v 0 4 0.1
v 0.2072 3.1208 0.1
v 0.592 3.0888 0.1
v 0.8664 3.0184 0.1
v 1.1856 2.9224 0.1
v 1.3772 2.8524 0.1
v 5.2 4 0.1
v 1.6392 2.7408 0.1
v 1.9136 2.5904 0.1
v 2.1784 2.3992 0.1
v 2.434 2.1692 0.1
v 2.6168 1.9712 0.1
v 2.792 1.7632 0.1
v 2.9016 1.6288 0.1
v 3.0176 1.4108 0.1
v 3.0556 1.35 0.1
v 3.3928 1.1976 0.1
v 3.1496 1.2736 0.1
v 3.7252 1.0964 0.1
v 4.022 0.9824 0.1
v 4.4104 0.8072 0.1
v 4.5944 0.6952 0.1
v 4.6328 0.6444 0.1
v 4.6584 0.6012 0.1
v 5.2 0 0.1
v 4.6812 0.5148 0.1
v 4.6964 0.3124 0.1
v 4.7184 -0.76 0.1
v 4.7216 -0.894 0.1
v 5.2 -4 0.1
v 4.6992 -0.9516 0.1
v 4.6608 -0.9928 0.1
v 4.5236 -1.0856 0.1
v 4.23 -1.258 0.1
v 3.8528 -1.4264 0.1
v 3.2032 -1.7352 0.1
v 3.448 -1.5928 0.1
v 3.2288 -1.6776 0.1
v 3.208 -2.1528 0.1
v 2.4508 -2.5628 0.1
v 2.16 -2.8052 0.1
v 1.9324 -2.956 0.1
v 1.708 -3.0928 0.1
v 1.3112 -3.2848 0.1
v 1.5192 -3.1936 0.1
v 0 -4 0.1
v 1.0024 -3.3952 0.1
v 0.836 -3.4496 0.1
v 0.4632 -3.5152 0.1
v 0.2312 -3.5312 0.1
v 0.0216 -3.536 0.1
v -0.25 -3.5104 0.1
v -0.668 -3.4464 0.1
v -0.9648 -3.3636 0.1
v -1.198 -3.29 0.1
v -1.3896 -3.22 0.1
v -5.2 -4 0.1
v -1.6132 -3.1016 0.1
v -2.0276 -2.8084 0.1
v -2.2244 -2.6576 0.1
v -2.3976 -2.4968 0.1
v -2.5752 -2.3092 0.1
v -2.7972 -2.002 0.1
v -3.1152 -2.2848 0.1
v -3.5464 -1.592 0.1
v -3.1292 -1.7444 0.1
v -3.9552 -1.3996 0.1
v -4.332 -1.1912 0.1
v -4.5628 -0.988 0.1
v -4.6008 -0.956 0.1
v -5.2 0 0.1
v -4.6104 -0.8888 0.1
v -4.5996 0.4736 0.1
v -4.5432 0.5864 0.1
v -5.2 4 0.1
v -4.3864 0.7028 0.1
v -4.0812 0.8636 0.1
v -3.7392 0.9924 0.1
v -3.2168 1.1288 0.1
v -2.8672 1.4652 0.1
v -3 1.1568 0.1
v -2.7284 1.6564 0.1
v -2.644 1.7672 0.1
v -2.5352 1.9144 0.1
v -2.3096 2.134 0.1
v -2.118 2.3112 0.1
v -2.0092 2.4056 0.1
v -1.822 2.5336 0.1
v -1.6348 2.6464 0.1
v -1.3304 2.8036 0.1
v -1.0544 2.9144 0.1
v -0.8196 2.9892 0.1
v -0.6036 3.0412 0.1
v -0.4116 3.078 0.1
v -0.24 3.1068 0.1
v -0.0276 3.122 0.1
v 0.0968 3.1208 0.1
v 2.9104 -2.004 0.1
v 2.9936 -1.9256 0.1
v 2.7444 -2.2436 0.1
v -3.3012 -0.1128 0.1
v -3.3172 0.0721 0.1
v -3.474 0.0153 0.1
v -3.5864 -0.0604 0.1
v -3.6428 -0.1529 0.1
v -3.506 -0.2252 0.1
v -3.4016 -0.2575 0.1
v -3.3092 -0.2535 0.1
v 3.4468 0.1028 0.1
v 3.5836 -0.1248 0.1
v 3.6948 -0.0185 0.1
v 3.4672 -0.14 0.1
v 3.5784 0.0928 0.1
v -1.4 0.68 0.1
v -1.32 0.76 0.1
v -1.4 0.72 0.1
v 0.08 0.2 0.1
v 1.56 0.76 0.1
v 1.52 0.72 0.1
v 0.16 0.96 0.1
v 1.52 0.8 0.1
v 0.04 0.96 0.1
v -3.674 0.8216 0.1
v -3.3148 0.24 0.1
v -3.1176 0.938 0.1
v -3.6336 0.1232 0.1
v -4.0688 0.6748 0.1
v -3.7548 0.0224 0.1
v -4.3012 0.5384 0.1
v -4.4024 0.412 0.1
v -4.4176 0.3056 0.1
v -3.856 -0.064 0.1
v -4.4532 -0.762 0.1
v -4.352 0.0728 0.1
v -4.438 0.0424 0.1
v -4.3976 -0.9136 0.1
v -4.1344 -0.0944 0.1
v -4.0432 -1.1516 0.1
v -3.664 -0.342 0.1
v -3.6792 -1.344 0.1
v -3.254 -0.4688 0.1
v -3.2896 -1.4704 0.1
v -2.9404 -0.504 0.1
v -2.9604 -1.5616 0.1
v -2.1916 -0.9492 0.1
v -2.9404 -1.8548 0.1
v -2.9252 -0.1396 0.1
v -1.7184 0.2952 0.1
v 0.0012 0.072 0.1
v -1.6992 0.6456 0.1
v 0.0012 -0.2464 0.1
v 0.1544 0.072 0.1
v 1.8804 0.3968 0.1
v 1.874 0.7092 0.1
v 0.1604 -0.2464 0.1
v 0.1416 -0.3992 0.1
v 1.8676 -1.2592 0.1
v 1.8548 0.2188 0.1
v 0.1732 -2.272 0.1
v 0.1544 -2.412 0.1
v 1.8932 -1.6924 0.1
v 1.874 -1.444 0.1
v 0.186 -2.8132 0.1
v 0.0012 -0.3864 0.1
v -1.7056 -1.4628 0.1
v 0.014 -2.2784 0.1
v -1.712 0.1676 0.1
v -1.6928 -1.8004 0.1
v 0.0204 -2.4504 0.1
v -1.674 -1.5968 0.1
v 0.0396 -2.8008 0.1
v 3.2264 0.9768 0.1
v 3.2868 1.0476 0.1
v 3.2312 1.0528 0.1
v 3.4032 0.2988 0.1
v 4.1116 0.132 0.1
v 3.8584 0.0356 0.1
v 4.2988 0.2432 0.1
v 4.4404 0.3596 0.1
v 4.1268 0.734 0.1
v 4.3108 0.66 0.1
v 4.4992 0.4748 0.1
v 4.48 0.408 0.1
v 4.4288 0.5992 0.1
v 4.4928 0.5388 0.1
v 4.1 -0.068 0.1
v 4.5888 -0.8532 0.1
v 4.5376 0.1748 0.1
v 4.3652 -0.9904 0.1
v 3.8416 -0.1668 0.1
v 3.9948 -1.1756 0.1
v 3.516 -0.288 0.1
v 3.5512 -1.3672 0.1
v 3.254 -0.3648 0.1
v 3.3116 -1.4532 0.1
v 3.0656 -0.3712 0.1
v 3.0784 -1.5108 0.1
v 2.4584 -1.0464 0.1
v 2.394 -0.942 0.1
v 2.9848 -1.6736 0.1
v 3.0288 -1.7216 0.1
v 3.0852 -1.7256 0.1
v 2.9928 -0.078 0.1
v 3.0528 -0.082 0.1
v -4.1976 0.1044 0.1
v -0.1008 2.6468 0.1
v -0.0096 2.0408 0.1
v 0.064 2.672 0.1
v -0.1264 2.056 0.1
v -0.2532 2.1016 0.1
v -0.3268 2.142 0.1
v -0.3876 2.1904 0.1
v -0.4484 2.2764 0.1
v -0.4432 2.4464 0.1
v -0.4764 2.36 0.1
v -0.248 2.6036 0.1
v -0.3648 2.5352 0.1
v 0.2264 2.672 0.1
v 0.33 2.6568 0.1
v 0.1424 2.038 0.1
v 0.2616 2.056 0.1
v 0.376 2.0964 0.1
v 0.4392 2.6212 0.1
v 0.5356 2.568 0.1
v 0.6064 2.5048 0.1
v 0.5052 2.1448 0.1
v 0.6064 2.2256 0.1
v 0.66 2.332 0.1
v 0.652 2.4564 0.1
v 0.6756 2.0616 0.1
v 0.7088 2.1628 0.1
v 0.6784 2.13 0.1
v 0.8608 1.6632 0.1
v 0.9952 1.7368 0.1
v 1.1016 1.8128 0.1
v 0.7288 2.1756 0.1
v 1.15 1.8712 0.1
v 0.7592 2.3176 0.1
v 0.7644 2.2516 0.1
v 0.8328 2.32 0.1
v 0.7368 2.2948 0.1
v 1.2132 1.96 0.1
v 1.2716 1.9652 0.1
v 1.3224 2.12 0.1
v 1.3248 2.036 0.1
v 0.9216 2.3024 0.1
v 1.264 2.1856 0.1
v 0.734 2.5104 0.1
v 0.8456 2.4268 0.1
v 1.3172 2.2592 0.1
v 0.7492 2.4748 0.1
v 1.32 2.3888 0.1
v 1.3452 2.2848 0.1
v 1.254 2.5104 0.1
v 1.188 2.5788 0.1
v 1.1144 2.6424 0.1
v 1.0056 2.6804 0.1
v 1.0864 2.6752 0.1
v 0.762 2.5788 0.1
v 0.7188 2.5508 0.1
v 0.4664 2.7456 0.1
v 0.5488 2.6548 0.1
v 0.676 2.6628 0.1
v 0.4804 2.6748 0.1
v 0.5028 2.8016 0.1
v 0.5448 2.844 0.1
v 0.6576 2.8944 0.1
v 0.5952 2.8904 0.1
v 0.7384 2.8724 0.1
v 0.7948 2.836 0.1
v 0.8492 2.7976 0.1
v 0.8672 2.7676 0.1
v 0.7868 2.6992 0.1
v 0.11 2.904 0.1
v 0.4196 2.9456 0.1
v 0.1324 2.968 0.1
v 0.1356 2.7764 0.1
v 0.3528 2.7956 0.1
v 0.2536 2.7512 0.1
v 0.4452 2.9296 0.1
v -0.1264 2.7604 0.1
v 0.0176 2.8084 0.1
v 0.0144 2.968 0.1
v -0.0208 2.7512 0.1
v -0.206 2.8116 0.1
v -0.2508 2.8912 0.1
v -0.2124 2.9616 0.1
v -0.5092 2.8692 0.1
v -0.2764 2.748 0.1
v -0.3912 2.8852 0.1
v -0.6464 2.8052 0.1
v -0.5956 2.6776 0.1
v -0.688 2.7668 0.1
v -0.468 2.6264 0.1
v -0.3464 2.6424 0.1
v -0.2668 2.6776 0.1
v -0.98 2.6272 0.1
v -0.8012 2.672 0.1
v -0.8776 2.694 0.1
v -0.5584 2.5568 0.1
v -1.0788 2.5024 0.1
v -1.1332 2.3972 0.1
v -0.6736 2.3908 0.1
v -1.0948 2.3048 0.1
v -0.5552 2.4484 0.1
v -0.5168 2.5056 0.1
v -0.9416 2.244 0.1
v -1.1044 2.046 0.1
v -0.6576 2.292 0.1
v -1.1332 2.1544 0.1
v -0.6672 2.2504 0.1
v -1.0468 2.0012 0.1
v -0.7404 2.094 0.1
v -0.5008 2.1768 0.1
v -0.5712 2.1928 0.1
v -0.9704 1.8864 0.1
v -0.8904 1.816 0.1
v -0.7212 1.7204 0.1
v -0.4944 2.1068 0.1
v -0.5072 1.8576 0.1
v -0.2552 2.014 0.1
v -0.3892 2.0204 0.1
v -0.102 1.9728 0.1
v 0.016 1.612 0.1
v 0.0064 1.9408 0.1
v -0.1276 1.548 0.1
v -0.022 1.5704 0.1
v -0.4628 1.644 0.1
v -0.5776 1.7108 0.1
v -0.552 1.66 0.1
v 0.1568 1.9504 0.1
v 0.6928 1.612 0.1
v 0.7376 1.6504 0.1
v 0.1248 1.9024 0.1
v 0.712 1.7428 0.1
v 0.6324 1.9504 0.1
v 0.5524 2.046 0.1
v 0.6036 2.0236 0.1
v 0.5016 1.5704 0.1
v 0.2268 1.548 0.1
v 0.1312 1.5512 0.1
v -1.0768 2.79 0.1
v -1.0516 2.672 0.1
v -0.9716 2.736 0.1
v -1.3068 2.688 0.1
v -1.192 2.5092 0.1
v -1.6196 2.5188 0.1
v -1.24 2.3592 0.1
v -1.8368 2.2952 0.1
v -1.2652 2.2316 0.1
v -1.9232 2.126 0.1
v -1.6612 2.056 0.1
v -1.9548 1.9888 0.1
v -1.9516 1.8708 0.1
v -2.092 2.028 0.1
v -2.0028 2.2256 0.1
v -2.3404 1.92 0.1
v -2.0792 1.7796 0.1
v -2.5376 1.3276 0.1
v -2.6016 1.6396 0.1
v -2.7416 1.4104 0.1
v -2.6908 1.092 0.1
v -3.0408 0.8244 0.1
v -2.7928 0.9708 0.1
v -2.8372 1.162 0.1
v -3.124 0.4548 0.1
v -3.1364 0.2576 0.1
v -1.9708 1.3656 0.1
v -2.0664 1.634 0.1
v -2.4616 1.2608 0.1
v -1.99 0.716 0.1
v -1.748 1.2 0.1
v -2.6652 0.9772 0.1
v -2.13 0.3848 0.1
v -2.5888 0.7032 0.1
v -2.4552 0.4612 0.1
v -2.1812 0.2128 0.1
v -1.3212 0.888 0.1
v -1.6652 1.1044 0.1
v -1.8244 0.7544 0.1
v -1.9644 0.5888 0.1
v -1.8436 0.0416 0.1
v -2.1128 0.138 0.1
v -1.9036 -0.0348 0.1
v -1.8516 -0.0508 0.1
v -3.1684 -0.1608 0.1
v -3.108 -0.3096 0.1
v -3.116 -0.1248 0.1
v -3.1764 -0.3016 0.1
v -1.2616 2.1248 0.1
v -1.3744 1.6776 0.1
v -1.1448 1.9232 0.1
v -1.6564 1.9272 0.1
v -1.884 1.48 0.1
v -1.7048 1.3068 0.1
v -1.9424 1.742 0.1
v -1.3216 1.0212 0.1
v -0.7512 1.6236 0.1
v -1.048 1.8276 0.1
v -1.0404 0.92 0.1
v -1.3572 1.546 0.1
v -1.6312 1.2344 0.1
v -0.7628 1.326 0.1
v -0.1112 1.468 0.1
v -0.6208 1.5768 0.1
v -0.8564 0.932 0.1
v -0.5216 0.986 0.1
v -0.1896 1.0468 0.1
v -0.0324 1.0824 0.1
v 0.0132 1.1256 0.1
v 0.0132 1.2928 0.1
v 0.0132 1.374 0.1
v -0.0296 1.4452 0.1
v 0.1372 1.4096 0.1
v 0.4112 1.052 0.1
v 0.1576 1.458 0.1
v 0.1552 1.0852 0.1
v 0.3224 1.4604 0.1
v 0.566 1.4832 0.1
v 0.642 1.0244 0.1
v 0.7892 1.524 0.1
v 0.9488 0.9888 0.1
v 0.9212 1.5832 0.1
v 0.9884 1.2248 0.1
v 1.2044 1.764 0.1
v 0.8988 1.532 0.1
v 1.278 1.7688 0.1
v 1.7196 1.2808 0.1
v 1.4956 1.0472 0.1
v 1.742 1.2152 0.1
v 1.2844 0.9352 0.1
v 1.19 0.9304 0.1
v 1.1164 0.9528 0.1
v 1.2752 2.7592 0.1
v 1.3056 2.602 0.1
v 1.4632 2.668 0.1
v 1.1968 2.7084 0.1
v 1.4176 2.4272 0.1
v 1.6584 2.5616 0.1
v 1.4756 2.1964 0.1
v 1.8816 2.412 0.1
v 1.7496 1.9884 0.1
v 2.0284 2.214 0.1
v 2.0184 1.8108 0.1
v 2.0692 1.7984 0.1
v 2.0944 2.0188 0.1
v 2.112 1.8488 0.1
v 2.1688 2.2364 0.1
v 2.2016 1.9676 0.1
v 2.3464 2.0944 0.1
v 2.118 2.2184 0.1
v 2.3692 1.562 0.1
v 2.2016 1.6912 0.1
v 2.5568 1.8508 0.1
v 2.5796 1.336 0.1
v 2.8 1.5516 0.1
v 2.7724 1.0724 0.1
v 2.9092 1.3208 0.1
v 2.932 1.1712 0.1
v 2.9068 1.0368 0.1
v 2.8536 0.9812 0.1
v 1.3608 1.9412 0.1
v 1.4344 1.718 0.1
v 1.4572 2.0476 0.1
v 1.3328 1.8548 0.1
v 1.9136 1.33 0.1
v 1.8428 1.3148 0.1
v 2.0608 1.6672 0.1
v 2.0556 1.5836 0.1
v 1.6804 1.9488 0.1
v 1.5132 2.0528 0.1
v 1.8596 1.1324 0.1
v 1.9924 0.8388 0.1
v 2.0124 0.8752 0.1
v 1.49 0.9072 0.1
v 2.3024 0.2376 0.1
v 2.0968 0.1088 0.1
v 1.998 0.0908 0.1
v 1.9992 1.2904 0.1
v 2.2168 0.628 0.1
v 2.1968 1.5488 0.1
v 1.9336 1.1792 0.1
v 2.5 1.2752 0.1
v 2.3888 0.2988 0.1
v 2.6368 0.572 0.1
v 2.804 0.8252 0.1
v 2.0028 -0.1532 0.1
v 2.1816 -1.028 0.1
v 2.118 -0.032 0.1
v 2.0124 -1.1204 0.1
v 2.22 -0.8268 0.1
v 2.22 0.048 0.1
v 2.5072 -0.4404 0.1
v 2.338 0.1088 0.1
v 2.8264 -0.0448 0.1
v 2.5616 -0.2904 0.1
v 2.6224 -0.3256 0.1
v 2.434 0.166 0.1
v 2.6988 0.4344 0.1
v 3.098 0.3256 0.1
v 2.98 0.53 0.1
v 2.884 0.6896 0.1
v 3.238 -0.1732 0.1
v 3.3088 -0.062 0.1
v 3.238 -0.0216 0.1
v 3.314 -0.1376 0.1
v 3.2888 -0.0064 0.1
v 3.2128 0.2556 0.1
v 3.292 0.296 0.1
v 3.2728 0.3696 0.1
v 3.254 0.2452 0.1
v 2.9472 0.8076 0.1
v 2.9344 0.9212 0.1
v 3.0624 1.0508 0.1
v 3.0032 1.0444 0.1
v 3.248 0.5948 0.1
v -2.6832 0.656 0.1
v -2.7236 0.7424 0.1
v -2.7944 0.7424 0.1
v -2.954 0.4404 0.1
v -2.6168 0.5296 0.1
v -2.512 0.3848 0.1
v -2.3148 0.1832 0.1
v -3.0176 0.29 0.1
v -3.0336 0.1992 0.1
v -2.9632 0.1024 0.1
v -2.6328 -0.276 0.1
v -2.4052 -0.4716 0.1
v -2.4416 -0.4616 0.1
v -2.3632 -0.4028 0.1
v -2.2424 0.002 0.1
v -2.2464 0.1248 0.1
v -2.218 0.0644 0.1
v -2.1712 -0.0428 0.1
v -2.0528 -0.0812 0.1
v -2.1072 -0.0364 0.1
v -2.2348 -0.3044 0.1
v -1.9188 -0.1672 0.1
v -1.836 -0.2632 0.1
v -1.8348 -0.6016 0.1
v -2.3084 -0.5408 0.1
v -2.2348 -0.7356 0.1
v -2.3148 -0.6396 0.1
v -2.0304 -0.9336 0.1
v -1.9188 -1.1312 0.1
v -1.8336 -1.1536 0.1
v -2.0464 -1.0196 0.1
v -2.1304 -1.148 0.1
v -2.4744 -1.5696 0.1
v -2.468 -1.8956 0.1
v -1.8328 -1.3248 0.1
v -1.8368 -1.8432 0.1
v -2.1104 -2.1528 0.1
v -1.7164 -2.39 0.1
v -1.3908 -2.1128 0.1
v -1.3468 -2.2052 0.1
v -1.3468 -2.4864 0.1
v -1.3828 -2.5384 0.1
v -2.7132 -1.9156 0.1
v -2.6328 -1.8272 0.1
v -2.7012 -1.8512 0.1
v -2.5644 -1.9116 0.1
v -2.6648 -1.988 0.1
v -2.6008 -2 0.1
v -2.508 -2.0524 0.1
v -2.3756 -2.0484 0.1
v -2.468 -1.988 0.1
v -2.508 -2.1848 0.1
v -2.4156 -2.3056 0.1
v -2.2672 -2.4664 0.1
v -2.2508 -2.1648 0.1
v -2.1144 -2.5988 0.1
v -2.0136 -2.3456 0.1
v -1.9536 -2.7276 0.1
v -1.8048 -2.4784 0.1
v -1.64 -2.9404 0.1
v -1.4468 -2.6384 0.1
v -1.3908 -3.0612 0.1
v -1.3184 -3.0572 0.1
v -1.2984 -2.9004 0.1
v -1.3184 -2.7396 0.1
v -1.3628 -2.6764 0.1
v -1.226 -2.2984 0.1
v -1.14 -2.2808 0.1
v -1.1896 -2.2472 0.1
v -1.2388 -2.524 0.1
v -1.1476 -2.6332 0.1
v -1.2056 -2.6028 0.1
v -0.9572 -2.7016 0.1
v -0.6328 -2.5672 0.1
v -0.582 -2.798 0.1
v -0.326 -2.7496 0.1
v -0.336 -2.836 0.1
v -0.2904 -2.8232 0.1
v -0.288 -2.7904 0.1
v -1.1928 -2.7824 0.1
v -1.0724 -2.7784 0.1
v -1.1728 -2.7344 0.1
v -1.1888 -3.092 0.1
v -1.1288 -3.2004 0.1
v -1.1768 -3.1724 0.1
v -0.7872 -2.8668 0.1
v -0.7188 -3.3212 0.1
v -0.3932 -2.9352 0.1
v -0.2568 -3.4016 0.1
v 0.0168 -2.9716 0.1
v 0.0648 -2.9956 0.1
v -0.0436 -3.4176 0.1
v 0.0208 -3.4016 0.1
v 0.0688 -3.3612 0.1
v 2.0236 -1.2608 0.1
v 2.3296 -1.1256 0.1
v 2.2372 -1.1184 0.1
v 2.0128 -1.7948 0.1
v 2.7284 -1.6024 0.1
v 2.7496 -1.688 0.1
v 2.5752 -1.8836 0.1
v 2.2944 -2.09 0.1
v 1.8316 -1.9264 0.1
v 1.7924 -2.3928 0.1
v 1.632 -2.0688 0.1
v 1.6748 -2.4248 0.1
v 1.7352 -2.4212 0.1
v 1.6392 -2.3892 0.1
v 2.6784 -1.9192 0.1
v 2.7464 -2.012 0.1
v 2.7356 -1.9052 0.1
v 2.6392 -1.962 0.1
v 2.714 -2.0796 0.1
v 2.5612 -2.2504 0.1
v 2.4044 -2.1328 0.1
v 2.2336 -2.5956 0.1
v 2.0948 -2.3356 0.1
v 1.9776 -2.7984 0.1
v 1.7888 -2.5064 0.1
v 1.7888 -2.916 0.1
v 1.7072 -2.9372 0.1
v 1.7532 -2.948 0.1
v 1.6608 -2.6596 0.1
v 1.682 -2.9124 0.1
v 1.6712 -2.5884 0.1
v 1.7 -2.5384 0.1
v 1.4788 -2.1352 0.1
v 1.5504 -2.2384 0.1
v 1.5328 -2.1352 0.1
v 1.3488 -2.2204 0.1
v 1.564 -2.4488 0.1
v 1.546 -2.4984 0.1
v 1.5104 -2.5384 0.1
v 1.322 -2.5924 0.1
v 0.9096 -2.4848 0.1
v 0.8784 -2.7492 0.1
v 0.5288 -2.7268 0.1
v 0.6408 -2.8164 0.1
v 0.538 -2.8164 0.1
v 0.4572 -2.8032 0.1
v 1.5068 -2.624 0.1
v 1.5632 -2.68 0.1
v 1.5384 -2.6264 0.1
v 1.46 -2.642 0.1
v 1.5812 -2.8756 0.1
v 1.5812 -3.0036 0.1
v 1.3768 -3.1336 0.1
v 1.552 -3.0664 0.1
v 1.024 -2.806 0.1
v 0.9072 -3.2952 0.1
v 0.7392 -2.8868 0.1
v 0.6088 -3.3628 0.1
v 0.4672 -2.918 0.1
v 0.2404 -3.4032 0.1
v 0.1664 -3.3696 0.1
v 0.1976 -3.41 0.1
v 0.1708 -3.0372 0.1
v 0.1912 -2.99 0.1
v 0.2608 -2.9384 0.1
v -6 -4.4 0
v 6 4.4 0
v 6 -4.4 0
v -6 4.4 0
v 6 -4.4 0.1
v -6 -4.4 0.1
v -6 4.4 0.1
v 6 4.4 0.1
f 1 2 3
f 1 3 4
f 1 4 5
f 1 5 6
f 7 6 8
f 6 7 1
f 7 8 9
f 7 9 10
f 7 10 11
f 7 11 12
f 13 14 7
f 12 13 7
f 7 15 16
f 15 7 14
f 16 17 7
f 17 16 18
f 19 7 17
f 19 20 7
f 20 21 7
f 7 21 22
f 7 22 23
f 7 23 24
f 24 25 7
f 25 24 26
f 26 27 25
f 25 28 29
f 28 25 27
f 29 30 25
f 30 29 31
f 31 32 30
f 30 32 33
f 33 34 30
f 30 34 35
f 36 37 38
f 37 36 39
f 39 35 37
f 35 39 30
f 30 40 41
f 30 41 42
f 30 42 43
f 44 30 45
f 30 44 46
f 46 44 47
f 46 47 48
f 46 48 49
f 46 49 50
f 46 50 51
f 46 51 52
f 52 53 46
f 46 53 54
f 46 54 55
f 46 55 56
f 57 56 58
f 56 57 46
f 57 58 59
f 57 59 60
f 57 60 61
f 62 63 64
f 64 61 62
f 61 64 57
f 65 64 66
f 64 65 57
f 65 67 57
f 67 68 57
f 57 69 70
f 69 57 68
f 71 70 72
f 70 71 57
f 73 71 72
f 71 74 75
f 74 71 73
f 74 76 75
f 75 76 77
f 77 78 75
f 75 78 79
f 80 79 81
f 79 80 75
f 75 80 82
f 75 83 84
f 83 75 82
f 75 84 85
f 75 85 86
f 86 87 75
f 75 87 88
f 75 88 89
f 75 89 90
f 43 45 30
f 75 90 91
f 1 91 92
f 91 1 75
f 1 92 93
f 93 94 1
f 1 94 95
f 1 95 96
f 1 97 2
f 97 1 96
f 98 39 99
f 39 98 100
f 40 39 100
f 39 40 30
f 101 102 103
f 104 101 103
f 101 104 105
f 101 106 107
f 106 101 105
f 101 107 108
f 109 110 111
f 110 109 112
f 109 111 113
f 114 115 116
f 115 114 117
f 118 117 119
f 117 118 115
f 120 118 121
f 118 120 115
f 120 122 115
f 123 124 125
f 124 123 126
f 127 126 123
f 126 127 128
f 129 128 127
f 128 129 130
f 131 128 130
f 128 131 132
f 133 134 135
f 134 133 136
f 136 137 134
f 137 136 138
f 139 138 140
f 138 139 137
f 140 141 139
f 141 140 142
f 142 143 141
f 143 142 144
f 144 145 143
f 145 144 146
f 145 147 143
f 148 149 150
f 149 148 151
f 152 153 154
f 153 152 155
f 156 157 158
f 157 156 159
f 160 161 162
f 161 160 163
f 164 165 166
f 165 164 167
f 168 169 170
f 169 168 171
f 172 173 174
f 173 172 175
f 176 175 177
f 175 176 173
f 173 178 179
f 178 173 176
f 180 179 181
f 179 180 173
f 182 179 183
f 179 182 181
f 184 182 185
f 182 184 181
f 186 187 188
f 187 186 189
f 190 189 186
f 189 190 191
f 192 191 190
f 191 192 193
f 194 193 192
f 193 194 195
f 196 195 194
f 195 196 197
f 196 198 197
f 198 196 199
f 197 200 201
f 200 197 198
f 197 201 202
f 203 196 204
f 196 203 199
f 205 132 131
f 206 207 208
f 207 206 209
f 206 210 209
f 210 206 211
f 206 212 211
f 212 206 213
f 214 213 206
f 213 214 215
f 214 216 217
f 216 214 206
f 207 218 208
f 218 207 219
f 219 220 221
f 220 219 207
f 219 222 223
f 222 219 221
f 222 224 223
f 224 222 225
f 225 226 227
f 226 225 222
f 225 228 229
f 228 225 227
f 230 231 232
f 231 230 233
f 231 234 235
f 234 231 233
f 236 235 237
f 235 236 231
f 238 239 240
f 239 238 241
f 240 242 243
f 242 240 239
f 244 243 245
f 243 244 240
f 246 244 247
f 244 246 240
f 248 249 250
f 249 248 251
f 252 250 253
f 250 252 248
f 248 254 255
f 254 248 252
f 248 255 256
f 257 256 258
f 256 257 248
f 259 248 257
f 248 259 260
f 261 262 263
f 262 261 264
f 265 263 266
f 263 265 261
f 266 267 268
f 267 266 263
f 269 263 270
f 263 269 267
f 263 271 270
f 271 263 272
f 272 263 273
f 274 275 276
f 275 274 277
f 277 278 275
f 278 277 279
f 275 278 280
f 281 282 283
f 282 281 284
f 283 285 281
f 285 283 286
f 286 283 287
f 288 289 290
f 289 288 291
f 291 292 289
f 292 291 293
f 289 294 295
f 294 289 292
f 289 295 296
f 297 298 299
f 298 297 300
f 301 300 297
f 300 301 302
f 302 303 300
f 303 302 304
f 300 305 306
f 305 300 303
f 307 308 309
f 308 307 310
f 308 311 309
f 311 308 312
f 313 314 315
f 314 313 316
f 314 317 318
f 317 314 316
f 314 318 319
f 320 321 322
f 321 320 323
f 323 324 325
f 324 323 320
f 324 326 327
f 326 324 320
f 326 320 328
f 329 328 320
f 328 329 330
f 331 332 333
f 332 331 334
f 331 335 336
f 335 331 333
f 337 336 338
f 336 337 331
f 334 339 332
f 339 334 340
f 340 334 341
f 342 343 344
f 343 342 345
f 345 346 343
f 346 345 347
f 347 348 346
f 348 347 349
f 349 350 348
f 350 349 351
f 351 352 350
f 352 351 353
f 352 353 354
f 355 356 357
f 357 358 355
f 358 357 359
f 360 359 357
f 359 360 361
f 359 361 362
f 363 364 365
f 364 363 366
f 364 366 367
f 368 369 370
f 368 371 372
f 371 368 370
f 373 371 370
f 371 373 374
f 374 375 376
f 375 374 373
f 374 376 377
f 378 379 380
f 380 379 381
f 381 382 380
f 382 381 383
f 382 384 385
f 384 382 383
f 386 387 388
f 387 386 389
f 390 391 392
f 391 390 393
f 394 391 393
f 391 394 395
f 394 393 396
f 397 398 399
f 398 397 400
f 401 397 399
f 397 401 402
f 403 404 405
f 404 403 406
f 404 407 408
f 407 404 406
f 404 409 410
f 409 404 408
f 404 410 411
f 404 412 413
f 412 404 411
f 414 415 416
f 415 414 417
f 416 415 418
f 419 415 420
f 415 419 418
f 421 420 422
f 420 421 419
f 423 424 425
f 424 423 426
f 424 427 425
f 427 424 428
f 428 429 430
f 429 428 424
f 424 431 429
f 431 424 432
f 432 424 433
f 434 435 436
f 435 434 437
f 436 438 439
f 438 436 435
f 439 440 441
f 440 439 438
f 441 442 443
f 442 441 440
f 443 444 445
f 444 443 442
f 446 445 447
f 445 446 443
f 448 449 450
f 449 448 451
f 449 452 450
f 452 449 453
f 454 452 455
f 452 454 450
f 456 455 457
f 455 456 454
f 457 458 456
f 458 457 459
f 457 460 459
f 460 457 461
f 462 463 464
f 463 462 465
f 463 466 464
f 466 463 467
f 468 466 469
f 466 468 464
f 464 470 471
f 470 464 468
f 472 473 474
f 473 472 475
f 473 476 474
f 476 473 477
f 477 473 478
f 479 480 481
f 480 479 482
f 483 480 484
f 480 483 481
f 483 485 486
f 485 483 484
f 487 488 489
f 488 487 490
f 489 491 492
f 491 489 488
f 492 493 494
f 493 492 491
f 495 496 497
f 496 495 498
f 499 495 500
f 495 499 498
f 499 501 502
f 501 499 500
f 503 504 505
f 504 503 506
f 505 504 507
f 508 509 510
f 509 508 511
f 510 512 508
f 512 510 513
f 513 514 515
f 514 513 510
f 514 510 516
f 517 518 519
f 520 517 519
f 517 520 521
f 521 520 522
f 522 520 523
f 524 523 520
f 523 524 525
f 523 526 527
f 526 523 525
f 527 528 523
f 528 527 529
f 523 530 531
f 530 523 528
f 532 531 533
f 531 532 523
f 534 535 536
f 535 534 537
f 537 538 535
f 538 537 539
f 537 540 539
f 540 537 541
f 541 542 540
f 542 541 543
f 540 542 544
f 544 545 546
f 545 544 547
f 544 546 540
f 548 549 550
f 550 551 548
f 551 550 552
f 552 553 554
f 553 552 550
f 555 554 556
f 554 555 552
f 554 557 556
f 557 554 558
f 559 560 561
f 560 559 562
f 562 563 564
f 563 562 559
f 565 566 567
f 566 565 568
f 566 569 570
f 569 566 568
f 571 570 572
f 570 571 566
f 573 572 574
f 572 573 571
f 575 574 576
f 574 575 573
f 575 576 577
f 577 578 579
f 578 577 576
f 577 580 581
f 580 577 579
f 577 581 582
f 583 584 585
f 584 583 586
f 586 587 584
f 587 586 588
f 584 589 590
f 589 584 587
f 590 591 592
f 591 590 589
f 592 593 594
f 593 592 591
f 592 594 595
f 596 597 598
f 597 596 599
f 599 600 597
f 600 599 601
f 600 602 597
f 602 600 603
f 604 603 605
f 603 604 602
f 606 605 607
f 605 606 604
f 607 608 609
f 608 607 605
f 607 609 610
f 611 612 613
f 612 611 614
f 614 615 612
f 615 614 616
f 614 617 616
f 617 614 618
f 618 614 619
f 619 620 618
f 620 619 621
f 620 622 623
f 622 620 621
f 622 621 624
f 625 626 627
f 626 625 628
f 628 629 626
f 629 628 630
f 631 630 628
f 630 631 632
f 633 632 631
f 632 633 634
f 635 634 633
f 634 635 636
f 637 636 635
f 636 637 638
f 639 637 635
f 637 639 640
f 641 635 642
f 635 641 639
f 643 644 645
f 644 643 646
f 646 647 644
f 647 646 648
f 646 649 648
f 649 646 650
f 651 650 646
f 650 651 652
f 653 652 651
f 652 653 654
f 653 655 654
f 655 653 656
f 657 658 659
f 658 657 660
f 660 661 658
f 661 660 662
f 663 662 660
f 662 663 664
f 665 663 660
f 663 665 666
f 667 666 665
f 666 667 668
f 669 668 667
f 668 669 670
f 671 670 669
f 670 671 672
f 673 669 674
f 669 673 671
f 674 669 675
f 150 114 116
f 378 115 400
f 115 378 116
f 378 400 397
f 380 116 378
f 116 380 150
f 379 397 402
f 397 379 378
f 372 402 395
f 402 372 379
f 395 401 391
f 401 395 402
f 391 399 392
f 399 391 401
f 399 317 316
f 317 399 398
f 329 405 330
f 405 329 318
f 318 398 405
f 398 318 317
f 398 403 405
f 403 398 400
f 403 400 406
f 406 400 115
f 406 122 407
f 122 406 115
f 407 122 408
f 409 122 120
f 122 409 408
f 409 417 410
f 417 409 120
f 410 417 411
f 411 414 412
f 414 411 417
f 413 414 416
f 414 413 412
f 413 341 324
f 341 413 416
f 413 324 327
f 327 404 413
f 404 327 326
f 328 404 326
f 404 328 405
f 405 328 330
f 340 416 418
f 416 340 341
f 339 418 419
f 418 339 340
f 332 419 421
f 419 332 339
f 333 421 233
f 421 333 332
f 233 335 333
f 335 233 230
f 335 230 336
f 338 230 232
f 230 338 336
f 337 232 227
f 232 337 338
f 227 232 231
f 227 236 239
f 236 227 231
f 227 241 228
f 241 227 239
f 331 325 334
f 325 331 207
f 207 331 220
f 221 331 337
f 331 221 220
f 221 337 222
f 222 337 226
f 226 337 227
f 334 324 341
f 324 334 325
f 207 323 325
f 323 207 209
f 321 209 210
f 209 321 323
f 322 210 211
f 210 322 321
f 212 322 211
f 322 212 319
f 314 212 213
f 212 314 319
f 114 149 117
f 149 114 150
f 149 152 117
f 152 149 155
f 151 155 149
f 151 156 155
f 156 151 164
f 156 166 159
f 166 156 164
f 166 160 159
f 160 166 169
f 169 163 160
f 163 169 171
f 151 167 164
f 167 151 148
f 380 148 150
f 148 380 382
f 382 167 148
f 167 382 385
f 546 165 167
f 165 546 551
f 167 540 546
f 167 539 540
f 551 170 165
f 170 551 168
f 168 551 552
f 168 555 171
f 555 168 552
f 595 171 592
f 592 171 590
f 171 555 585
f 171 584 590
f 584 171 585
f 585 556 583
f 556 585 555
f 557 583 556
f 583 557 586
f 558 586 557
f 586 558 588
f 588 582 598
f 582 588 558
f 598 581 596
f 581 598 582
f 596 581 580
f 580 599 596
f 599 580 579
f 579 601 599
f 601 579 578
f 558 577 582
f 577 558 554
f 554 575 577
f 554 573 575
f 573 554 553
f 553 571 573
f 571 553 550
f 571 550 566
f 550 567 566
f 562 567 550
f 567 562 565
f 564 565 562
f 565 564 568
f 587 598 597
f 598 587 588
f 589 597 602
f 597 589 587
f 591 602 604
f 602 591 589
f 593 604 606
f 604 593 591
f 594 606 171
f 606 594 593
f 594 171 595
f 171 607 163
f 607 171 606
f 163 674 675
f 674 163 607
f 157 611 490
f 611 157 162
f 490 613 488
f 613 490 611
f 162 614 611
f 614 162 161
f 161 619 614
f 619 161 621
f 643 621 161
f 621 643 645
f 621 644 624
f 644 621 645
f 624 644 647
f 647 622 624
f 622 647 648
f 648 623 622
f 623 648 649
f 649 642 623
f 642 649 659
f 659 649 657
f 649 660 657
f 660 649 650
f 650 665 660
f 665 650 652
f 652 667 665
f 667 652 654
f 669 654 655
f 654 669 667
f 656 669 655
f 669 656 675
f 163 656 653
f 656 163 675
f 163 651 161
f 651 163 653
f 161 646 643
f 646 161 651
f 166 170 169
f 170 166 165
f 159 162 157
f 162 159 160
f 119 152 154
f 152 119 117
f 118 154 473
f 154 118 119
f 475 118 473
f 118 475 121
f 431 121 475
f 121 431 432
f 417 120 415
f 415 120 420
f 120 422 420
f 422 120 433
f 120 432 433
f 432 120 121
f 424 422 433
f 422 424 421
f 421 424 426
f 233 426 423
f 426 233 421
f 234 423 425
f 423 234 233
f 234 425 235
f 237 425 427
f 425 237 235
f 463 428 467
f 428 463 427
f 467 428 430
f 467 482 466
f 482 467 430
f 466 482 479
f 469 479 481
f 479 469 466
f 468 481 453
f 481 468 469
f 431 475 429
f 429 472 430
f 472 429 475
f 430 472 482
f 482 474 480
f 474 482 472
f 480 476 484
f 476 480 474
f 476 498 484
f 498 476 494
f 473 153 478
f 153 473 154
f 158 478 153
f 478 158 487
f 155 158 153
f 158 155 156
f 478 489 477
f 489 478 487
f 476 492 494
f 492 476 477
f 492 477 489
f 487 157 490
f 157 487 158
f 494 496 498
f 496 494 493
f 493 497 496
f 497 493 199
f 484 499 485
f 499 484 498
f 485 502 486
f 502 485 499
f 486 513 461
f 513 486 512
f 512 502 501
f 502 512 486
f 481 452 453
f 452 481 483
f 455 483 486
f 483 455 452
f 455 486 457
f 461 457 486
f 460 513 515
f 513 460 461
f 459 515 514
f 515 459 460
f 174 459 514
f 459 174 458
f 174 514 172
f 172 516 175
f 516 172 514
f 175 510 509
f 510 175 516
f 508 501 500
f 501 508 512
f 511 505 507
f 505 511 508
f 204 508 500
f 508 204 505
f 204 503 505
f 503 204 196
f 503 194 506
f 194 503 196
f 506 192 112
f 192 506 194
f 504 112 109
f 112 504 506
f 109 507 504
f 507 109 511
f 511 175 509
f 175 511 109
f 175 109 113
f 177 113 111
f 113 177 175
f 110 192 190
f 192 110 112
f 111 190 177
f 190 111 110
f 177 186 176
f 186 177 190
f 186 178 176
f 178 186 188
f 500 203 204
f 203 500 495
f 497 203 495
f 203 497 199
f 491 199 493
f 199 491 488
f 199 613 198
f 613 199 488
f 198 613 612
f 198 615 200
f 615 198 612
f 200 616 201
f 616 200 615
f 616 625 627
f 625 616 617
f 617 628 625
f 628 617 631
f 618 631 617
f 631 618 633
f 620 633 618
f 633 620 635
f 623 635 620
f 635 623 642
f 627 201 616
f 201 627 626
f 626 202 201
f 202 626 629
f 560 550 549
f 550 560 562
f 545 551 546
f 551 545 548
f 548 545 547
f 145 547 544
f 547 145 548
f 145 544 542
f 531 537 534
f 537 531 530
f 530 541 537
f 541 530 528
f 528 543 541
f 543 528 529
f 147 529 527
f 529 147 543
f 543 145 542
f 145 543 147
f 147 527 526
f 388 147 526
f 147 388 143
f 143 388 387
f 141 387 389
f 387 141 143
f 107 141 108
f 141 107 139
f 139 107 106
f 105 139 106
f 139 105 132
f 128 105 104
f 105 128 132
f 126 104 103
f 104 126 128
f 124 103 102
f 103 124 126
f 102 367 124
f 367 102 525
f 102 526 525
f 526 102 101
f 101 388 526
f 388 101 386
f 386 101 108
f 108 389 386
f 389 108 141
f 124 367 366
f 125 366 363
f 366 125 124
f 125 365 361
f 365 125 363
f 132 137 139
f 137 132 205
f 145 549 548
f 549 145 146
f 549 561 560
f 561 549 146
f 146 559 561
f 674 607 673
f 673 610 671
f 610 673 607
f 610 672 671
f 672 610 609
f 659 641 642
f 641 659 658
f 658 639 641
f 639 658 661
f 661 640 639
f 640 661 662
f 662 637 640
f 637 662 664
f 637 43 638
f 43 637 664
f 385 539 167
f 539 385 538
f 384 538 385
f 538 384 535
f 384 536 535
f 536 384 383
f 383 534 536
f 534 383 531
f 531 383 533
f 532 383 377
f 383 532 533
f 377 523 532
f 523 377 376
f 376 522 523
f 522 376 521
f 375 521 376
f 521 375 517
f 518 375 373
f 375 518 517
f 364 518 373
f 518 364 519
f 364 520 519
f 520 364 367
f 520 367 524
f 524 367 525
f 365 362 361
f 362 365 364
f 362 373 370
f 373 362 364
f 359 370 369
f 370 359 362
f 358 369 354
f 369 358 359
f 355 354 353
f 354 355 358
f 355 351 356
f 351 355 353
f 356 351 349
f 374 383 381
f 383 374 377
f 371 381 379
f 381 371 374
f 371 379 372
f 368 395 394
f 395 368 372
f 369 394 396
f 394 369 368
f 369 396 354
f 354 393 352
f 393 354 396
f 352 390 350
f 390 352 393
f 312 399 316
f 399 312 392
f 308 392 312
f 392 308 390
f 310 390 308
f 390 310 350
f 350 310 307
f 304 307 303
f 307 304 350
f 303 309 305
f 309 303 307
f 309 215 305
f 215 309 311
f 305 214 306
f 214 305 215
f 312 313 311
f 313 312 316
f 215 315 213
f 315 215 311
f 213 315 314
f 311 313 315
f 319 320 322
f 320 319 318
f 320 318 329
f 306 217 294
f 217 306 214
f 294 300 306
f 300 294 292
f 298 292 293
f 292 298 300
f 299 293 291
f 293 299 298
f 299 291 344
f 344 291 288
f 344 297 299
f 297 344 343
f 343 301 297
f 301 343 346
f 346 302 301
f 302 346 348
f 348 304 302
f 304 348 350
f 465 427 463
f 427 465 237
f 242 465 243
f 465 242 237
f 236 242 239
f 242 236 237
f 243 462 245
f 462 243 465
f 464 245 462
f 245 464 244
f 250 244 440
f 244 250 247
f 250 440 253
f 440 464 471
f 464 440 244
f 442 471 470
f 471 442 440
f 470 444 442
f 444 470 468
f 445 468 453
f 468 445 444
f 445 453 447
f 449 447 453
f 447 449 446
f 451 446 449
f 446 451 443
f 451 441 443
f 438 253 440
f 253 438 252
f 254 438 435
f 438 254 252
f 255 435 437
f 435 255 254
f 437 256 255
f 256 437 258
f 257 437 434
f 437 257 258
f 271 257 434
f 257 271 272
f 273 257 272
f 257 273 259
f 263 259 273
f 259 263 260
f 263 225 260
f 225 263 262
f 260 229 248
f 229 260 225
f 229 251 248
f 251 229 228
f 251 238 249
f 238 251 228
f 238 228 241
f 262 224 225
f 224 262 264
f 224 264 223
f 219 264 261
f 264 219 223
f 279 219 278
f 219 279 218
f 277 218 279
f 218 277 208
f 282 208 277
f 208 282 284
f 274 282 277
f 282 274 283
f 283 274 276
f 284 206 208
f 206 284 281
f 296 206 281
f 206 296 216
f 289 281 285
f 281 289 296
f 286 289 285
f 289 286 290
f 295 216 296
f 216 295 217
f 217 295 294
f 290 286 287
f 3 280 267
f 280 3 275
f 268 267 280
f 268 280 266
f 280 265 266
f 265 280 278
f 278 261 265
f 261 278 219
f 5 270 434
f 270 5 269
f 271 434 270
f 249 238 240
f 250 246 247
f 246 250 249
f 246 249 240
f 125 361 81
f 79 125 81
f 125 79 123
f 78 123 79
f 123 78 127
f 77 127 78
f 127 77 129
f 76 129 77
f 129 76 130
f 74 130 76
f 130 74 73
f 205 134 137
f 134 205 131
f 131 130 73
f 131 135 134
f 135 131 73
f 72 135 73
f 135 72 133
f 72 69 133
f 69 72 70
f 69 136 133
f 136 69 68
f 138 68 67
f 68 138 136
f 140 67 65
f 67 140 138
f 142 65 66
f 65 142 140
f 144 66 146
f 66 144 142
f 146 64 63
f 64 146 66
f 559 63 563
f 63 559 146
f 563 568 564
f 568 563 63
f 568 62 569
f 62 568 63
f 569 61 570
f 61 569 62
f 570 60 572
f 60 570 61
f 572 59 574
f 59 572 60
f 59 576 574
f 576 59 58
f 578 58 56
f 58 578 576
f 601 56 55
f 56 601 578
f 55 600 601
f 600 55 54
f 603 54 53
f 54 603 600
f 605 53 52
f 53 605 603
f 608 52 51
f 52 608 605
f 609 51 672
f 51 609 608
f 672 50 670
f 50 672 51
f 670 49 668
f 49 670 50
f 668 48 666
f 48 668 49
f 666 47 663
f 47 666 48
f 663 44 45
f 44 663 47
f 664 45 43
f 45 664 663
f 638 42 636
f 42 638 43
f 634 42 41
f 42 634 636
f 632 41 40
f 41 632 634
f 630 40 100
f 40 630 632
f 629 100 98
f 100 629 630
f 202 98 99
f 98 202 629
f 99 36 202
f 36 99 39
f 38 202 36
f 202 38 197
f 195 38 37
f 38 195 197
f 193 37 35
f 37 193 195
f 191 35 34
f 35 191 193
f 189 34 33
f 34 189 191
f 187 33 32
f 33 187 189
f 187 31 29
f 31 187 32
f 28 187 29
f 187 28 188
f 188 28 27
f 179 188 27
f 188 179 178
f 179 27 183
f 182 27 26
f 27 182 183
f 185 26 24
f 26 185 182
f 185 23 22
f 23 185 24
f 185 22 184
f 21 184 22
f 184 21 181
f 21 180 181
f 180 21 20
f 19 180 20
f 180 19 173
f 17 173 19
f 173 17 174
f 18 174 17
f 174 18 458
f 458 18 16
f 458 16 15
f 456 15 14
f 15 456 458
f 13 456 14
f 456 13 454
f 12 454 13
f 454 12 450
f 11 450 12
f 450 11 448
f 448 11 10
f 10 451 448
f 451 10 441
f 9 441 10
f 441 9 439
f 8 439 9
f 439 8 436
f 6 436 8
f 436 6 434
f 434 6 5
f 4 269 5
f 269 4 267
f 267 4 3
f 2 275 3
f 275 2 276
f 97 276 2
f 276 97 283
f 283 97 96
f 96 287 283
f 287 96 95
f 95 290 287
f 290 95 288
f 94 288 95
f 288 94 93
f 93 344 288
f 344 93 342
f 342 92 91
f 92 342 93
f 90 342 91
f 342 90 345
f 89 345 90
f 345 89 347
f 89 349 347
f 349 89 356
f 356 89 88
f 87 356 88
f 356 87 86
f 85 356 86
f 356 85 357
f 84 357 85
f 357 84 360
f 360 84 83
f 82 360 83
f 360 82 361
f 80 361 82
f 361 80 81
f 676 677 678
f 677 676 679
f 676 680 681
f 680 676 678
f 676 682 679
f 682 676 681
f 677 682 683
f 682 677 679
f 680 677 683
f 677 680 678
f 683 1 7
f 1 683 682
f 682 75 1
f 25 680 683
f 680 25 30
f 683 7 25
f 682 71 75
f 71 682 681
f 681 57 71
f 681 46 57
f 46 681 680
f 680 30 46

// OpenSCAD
use <../lib.scad>
use <../p/box5-12.scad>
use <s/169675as01.scad>
function ldraw_lib__169675a() = [
// 0 Sticker  1.1 x  1.5 with Blue Globe, Yellow Box and Curved Arrows
// 0 Name: 169675a.dat
// 0 Author: Ulrich Röder [UR]
// 0 !LDRAW_ORG Part UPDATE 2022-06
// 0 !LICENSE Licensed under CC BY 2.0 and CC BY 4.0 : see CAreadme.txt
// 
// 0 BFC CERTIFY CCW
  [0,"BFC","CERTIFY"],
  [0,"BFC","CCW"],
// 
// 0 !KEYWORDS Set 4555, Station, Train, Transport
// 
// 0 !HISTORY 2019-06-28 [PTadmin] Official Update 2019-01
// 0 !HISTORY 2022-12-03 [MMR1988] Standardised description
// 0 !HISTORY 2022-12-20 [PTadmin] Official Update 2022-06
// 
// 
// 0 // Main
// 
// 1 16 0 -0.25 0 1 0 0 0 1 0 0 0 1 s\169675as01.dat
  [1,16,0,-0.25,0,1,0,0,0,1,0,0,0,1, ldraw_lib__s__169675as01()],
// 1 16 0 -.25 0 15 0 0 0 .25 0 0 0 -11 box5-12.dat
  [1,16,0,-.25,0,15,0,0,0,.25,0,0,0,-11, ldraw_lib__box5_12()],
// 4 16 0 -.25 10 13 -.25 10 15 -.25 11 -15 -.25 11
  [4,16,0,-.25,10,13,-.25,10,15,-.25,11,-15,-.25,11],
// 3 16 -15 -.25 11 -13 -.25 10 0 -.25 10
  [3,16,-15,-.25,11,-13,-.25,10,0,-.25,10],
// 4 16 15 -.25 -11 15 -.25 11 13 -.25 0 13 -.25 -10
  [4,16,15,-.25,-11,15,-.25,11,13,-.25,0,13,-.25,-10],
// 3 16 15 -.25 11 13 -.25 10 13 -.25 0
  [3,16,15,-.25,11,13,-.25,10,13,-.25,0],
// 4 16 -15 -.25 11 -15 -.25 -11 -13 -.25 0 -13 -.25 10
  [4,16,-15,-.25,11,-15,-.25,-11,-13,-.25,0,-13,-.25,10],
// 3 16 -15 -.25 -11 -13 -.25 -10 -13 -.25 0
  [3,16,-15,-.25,-11,-13,-.25,-10,-13,-.25,0],
// 4 16 -15 -.25 -11 15 -.25 -11 0 -.25 -10 -13 -.25 -10
  [4,16,-15,-.25,-11,15,-.25,-11,0,-.25,-10,-13,-.25,-10],
// 3 16 15 -.25 -11 13 -.25 -10 0 -.25 -10
  [3,16,15,-.25,-11,13,-.25,-10,0,-.25,-10],
];
makepoly(ldraw_lib__169675a(), line=0.2);
